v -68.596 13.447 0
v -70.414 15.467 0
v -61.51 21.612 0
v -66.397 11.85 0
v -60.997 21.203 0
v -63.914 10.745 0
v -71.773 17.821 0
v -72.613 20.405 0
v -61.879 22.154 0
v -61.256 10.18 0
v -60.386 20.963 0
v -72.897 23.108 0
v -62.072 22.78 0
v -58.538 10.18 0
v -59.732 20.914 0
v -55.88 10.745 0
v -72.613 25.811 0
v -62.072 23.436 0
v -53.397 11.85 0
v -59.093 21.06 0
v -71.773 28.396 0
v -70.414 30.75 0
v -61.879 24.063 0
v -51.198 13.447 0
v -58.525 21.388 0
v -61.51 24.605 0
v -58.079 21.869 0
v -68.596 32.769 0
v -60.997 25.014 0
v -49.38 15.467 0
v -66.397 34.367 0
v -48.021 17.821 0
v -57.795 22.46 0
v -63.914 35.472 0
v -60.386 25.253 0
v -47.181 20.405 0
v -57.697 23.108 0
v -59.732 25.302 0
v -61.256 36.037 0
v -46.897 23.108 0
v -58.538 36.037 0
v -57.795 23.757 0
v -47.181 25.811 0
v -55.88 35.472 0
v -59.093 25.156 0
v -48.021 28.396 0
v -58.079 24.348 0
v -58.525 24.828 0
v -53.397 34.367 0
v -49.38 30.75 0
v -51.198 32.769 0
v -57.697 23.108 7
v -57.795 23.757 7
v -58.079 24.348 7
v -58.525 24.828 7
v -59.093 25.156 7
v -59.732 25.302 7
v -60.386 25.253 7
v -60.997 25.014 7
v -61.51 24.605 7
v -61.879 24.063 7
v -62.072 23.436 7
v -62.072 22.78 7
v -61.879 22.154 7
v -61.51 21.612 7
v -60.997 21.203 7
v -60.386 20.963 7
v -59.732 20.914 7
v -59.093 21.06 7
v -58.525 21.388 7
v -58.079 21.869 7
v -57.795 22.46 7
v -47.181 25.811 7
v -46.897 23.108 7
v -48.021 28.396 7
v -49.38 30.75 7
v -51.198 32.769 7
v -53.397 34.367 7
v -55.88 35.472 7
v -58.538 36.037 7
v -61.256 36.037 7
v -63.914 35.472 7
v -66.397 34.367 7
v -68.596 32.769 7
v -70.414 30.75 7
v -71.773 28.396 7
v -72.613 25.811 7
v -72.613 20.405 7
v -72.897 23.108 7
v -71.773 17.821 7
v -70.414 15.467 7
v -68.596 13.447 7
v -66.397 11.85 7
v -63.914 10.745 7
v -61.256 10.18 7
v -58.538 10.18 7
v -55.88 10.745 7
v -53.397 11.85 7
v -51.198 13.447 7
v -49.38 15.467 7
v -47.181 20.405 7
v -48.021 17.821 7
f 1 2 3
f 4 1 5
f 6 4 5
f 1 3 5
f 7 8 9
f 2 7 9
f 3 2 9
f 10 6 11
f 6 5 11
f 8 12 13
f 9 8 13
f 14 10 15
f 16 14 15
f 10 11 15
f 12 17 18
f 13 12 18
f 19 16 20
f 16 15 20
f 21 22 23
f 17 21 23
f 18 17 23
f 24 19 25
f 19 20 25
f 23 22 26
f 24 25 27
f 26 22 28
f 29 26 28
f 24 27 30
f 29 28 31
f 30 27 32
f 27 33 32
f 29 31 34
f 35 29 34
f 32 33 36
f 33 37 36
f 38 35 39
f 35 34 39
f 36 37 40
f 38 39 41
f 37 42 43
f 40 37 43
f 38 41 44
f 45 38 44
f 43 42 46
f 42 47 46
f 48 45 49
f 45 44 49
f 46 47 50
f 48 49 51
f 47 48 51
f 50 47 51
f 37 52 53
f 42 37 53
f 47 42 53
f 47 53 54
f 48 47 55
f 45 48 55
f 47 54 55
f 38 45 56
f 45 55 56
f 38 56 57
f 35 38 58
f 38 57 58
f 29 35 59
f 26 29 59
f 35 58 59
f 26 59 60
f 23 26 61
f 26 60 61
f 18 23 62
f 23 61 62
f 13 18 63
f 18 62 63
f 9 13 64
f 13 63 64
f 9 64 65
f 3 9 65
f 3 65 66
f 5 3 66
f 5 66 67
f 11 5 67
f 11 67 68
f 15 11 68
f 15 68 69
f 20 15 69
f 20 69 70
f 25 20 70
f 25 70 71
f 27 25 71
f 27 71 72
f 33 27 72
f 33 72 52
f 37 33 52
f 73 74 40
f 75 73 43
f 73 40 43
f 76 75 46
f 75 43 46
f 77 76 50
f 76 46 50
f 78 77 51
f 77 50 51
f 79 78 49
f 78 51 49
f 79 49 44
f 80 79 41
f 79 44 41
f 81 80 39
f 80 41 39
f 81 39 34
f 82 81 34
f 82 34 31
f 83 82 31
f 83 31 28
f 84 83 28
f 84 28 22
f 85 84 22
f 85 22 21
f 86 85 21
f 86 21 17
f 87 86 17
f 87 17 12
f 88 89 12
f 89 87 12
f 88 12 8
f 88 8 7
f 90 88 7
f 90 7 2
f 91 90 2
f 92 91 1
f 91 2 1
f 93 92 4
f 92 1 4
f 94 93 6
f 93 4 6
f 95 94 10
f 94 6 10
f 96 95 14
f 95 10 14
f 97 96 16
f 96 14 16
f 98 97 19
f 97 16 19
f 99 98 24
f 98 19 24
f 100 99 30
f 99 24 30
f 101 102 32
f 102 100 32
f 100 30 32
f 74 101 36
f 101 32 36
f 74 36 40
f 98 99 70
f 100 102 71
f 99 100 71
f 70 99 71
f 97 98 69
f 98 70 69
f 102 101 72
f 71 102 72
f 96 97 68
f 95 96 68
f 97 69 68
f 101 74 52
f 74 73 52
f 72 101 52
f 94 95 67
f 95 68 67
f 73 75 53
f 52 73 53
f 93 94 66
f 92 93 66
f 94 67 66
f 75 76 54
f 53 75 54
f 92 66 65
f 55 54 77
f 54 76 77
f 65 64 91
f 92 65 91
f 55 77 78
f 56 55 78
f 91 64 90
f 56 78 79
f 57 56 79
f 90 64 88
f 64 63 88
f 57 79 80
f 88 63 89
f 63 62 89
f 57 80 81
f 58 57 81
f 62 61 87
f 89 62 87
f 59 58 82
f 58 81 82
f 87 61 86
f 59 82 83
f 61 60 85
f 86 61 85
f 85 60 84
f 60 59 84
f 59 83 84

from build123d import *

# Parameters (mm, degrees)
SKETCH1_R           = 13
SKETCH1_R_2         = 1.5
BOSS_EXTRUDE1_DEPTH = 8
SKETCH2_R           = 2.2
CUT_EXTRUDE1_DEPTH  = 10
CUT_EXTRUDE2_DEPTH  = 1


with BuildPart() as part:
    # Sketch1 → Boss-Extrude1 (new body)
    with BuildSketch(Plane.XY):
        with Locations((-59.896810081, 23.108337223)):
            Circle(SKETCH1_R)
        with Locations((-59.896810081, 23.108337223)):
            Circle(SKETCH1_R_2, mode=Mode.SUBTRACT)
    extrude(amount=BOSS_EXTRUDE1_DEPTH)

    # Sketch2 → Cut-Extrude1 (cut)
    with BuildSketch(Plane.XY.offset(8)):
        with Locations((-59.896810081, 23.108337223)):
            Circle(SKETCH2_R)
    extrude(amount=-CUT_EXTRUDE1_DEPTH, mode=Mode.SUBTRACT)

    # Sketch4 → Cut-Extrude2 (cut)
    with BuildSketch(Plane.XY.offset(8)):
        Polygon((-73.325248838, 36.16514022), (-53.384391692, 38.140415901), (-46.517922759, 36.16514022), (-46.517922759, 9.754225618), (-73.325248838, 9.754225618), align=None)
    extrude(amount=-CUT_EXTRUDE2_DEPTH, mode=Mode.SUBTRACT)


solid = part.part
